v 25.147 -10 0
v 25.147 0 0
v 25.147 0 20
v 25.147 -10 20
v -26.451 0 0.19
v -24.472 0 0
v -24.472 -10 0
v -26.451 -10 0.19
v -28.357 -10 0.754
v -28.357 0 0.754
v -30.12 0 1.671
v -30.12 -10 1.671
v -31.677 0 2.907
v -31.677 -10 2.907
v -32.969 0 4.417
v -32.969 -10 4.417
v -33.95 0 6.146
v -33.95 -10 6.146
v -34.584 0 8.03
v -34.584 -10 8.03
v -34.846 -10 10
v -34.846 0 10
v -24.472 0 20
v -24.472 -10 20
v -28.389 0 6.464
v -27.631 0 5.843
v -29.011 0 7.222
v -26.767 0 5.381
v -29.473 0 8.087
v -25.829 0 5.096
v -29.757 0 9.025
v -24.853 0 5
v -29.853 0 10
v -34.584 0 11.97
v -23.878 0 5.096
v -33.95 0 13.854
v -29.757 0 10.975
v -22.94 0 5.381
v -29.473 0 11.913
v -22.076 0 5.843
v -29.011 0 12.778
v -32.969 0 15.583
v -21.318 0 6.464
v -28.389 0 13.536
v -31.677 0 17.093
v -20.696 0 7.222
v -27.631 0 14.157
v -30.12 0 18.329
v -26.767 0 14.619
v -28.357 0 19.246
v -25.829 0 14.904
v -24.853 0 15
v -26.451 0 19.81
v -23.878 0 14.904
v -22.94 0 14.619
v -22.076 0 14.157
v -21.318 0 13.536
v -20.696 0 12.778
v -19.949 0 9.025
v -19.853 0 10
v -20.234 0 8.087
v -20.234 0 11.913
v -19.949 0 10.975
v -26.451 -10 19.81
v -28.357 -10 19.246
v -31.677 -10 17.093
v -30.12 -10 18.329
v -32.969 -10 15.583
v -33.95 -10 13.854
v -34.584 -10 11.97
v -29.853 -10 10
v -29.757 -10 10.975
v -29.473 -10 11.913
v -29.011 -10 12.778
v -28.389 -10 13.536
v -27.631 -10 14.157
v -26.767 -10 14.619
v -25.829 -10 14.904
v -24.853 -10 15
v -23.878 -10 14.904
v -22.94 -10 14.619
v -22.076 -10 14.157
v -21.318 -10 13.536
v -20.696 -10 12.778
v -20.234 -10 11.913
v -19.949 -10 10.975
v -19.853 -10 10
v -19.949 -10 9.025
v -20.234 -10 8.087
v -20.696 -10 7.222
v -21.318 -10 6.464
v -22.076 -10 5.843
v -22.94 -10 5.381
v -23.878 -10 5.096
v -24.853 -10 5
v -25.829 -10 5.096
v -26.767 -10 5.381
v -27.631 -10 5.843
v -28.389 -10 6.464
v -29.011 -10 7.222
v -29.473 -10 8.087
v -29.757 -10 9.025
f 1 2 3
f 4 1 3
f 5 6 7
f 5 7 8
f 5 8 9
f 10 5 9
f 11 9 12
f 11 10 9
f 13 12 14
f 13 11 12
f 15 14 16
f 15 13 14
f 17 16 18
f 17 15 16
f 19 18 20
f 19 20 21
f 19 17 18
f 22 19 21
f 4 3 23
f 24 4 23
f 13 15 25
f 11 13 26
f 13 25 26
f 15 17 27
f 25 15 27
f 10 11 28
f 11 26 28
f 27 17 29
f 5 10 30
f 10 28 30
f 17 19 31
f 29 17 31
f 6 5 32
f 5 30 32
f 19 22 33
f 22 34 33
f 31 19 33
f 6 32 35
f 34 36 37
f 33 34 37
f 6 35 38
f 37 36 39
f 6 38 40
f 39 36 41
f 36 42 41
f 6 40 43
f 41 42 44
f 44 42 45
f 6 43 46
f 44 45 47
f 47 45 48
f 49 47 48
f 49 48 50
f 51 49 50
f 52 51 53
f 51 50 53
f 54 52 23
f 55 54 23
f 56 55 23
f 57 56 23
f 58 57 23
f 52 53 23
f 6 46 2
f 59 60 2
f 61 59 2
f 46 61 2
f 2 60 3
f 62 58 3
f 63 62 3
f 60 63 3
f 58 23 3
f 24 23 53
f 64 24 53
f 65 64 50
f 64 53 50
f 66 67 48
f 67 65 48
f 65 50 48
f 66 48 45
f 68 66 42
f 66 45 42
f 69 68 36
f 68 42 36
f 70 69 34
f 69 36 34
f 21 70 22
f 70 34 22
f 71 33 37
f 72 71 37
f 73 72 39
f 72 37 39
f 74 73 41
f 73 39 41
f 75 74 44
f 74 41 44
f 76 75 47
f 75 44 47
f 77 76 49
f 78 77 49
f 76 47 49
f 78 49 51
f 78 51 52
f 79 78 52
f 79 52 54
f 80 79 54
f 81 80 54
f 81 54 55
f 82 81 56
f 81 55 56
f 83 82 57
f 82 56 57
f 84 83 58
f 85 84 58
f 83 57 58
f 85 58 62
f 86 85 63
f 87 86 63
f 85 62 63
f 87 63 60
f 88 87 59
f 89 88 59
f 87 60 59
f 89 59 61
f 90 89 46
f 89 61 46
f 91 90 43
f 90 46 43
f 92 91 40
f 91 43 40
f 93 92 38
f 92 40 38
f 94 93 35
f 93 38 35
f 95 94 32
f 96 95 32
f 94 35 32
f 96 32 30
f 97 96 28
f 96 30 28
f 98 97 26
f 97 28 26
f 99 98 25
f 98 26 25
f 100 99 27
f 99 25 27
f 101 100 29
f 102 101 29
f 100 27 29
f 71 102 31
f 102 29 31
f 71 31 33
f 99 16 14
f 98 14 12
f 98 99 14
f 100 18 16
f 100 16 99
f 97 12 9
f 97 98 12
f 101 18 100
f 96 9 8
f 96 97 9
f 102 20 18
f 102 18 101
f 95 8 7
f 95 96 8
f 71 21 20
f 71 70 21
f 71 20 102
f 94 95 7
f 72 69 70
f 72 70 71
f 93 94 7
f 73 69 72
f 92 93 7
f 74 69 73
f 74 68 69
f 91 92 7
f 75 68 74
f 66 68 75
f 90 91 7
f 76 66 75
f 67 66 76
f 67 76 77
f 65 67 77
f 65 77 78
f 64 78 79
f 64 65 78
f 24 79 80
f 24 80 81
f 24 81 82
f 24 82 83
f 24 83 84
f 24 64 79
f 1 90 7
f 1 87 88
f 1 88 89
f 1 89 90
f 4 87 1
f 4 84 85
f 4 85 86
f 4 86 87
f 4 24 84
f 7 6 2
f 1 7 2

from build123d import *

# Parameters (mm, degrees)
F1_DEPTH    = 10
F2_T1_DEPTH = 61.905591591


# Not quite as in the source:
# - a fillet or chamfer that OpenCascade refuses, or shapes differently, is made with other operations: its cross-section is extruded or revolved along the edge and cut away or added


with BuildPart() as f1:
    # F0 (on Front) → F1 (new body)
    with BuildSketch(Plane.XZ):
        Polygon((-34.8533578217, 10), (-34.8533578217, 0), (25.1466421783, 0), (25.1466421783, 20), (-34.8533578217, 20), align=None)
        with BuildLine():
            ThreePointArc((-19.8533578217, 10), (-24.8533578217, 5), (-29.8533578217, 10))
            ThreePointArc((-29.8533578217, 10), (-24.8533578217, 15), (-19.8533578217, 10))
        make_face(mode=Mode.SUBTRACT)
    extrude(amount=F1_DEPTH)

    # F2: fillet of radius 10.3811183182 on 2 edges, made by hand

    # F2_s2 → F2_t1 (cut)
    with BuildSketch(Plane.XZ.offset(-25.9527957955)):
        with BuildLine():
            ThreePointArc((-24.4722395035, 20), (-31.8127986626, 16.9594408409), (-34.8533578217, 9.6188816818))
            Line((-34.8533578217, 9.6188816818), (-34.8533578217, 20))
            Line((-34.8533578217, 20), (-24.4722395035, 20))
        make_face()
        with BuildLine():
            ThreePointArc((-24.4722395035, 0), (-31.8127986626, 3.0405591591), (-34.8533578217, 10.3811183182))
            Line((-34.8533578217, 10.3811183182), (-34.8533578217, 0))
            Line((-34.8533578217, 0), (-24.4722395035, 0))
        make_face()
    extrude(amount=F2_T1_DEPTH, mode=Mode.SUBTRACT)


solid = f1.part
